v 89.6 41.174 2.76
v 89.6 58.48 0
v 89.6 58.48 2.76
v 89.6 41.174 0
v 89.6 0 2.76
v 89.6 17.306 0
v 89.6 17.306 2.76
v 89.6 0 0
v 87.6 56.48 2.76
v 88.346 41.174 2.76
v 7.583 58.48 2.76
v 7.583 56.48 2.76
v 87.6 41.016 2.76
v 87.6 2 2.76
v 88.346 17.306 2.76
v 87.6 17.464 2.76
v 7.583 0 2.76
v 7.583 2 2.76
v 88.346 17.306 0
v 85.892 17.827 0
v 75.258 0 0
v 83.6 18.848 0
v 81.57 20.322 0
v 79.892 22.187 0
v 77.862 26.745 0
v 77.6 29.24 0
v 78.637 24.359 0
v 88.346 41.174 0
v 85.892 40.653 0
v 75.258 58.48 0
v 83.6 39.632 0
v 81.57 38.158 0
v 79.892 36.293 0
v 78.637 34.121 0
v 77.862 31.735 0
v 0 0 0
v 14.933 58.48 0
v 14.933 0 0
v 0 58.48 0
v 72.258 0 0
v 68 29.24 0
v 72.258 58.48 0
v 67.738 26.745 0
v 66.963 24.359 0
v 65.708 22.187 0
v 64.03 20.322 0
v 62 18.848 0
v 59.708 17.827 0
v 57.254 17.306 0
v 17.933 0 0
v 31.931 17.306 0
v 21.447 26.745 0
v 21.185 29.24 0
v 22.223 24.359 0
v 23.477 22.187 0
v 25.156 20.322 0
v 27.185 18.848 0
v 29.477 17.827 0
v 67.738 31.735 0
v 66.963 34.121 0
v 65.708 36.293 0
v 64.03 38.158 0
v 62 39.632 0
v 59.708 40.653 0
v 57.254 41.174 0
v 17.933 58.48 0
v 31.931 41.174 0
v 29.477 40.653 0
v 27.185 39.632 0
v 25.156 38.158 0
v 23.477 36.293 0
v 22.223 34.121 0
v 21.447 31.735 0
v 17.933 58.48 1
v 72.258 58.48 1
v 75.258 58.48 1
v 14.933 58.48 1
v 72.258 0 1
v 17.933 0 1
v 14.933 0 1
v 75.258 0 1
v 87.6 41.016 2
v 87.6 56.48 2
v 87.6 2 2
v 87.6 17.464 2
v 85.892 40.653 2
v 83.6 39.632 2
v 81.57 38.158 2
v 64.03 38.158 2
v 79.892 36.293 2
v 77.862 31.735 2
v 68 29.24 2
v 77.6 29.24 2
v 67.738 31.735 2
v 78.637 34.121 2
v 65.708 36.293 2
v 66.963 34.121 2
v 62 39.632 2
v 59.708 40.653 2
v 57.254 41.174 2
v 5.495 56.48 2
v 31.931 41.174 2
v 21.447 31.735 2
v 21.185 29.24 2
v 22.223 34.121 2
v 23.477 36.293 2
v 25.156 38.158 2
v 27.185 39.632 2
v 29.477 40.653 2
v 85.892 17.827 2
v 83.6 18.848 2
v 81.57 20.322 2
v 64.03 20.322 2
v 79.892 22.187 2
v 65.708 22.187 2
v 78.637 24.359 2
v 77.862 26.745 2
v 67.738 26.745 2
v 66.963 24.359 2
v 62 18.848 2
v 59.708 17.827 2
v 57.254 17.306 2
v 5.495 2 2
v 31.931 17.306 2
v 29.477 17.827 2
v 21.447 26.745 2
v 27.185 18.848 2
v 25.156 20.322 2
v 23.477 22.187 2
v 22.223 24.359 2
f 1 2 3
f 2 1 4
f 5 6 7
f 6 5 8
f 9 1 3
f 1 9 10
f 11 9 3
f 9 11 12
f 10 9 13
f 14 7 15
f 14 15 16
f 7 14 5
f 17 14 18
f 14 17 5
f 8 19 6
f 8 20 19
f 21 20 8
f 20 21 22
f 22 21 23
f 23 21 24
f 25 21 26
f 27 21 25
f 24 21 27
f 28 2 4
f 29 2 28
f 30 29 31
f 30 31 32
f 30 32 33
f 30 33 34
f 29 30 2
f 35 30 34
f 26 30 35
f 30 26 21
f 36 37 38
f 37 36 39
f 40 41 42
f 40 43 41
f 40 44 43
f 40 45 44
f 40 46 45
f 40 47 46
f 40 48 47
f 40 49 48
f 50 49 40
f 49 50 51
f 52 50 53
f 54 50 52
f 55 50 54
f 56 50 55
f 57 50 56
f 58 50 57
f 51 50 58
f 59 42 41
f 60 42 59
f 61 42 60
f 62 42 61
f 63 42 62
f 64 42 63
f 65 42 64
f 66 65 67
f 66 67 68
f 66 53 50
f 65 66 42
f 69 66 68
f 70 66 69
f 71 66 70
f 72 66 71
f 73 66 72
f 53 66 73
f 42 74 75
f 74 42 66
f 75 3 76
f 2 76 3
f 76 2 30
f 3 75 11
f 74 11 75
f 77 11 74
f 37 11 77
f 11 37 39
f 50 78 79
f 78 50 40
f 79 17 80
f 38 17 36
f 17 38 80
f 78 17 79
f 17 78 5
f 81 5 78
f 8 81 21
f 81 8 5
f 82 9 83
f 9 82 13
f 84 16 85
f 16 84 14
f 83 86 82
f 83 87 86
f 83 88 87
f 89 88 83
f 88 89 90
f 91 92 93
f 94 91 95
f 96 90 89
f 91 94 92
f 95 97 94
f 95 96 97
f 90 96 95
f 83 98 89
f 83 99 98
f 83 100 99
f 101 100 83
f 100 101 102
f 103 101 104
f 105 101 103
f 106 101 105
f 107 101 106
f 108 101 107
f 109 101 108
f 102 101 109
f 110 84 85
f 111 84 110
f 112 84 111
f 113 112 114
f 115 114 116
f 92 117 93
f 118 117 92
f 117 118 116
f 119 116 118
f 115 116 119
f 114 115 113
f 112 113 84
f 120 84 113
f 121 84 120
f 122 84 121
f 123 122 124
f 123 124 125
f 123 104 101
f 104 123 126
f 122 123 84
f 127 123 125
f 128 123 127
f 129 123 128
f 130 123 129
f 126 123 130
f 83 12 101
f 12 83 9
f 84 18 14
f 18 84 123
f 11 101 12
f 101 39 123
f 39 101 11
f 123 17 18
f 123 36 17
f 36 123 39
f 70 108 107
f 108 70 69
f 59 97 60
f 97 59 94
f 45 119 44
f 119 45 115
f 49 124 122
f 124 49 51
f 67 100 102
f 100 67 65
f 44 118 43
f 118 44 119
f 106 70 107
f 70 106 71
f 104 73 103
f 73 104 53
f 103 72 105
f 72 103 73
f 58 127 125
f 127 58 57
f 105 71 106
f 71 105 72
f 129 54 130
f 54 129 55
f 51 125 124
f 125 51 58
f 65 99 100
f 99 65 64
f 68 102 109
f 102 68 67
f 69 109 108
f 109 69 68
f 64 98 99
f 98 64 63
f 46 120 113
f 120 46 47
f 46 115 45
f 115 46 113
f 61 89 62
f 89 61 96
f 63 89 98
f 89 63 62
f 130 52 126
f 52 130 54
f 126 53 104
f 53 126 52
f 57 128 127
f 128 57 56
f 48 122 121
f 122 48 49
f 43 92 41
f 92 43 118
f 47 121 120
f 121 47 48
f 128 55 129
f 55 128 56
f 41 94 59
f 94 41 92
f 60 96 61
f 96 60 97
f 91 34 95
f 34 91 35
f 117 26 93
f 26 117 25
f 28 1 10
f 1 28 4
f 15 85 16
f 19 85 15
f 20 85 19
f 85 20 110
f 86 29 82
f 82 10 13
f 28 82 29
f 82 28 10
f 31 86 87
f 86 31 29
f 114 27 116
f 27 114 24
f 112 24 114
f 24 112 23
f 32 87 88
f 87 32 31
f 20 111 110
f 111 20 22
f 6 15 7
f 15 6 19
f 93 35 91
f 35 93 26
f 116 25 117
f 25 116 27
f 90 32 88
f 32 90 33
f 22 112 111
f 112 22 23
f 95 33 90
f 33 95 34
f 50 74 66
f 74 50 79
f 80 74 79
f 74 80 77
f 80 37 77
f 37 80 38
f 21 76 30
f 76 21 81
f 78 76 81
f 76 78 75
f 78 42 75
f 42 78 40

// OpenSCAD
playroom = 0.5;
cc_dimensions = [85.60,53.98+playroom,0.76];
wallet_dimensions = cc_dimensions + [4,4,2];
thumb_radius=12;

difference() {
	cube(wallet_dimensions);
	translate([
		(wallet_dimensions[0]-cc_dimensions[0])/2,
		(wallet_dimensions[1]-cc_dimensions[1])/2,
		wallet_dimensions[2]-cc_dimensions[2]]) 
			cube(cc_dimensions);
	rotate([0,-20,0]) cube([10,wallet_dimensions[1],wallet_dimensions[2]]);
	hull() {
		translate([wallet_dimensions[0]/1.6, wallet_dimensions[1]/2, 0]) cylinder(r=thumb_radius,h=wallet_dimensions[2]);
		translate([wallet_dimensions[0]/2.7, wallet_dimensions[1]/2, 0]) cylinder(r=thumb_radius,h=wallet_dimensions[2]);
	}
	translate([wallet_dimensions[0], wallet_dimensions[1]/2, 0]) cylinder(r=thumb_radius,h=wallet_dimensions[2]);
	translate([wallet_dimensions[0]/6,0,0]) 	cube([3,wallet_dimensions[1],1]);
	translate([wallet_dimensions[0]/1.24,0,0]) 	cube([3,wallet_dimensions[1],1]);
}
